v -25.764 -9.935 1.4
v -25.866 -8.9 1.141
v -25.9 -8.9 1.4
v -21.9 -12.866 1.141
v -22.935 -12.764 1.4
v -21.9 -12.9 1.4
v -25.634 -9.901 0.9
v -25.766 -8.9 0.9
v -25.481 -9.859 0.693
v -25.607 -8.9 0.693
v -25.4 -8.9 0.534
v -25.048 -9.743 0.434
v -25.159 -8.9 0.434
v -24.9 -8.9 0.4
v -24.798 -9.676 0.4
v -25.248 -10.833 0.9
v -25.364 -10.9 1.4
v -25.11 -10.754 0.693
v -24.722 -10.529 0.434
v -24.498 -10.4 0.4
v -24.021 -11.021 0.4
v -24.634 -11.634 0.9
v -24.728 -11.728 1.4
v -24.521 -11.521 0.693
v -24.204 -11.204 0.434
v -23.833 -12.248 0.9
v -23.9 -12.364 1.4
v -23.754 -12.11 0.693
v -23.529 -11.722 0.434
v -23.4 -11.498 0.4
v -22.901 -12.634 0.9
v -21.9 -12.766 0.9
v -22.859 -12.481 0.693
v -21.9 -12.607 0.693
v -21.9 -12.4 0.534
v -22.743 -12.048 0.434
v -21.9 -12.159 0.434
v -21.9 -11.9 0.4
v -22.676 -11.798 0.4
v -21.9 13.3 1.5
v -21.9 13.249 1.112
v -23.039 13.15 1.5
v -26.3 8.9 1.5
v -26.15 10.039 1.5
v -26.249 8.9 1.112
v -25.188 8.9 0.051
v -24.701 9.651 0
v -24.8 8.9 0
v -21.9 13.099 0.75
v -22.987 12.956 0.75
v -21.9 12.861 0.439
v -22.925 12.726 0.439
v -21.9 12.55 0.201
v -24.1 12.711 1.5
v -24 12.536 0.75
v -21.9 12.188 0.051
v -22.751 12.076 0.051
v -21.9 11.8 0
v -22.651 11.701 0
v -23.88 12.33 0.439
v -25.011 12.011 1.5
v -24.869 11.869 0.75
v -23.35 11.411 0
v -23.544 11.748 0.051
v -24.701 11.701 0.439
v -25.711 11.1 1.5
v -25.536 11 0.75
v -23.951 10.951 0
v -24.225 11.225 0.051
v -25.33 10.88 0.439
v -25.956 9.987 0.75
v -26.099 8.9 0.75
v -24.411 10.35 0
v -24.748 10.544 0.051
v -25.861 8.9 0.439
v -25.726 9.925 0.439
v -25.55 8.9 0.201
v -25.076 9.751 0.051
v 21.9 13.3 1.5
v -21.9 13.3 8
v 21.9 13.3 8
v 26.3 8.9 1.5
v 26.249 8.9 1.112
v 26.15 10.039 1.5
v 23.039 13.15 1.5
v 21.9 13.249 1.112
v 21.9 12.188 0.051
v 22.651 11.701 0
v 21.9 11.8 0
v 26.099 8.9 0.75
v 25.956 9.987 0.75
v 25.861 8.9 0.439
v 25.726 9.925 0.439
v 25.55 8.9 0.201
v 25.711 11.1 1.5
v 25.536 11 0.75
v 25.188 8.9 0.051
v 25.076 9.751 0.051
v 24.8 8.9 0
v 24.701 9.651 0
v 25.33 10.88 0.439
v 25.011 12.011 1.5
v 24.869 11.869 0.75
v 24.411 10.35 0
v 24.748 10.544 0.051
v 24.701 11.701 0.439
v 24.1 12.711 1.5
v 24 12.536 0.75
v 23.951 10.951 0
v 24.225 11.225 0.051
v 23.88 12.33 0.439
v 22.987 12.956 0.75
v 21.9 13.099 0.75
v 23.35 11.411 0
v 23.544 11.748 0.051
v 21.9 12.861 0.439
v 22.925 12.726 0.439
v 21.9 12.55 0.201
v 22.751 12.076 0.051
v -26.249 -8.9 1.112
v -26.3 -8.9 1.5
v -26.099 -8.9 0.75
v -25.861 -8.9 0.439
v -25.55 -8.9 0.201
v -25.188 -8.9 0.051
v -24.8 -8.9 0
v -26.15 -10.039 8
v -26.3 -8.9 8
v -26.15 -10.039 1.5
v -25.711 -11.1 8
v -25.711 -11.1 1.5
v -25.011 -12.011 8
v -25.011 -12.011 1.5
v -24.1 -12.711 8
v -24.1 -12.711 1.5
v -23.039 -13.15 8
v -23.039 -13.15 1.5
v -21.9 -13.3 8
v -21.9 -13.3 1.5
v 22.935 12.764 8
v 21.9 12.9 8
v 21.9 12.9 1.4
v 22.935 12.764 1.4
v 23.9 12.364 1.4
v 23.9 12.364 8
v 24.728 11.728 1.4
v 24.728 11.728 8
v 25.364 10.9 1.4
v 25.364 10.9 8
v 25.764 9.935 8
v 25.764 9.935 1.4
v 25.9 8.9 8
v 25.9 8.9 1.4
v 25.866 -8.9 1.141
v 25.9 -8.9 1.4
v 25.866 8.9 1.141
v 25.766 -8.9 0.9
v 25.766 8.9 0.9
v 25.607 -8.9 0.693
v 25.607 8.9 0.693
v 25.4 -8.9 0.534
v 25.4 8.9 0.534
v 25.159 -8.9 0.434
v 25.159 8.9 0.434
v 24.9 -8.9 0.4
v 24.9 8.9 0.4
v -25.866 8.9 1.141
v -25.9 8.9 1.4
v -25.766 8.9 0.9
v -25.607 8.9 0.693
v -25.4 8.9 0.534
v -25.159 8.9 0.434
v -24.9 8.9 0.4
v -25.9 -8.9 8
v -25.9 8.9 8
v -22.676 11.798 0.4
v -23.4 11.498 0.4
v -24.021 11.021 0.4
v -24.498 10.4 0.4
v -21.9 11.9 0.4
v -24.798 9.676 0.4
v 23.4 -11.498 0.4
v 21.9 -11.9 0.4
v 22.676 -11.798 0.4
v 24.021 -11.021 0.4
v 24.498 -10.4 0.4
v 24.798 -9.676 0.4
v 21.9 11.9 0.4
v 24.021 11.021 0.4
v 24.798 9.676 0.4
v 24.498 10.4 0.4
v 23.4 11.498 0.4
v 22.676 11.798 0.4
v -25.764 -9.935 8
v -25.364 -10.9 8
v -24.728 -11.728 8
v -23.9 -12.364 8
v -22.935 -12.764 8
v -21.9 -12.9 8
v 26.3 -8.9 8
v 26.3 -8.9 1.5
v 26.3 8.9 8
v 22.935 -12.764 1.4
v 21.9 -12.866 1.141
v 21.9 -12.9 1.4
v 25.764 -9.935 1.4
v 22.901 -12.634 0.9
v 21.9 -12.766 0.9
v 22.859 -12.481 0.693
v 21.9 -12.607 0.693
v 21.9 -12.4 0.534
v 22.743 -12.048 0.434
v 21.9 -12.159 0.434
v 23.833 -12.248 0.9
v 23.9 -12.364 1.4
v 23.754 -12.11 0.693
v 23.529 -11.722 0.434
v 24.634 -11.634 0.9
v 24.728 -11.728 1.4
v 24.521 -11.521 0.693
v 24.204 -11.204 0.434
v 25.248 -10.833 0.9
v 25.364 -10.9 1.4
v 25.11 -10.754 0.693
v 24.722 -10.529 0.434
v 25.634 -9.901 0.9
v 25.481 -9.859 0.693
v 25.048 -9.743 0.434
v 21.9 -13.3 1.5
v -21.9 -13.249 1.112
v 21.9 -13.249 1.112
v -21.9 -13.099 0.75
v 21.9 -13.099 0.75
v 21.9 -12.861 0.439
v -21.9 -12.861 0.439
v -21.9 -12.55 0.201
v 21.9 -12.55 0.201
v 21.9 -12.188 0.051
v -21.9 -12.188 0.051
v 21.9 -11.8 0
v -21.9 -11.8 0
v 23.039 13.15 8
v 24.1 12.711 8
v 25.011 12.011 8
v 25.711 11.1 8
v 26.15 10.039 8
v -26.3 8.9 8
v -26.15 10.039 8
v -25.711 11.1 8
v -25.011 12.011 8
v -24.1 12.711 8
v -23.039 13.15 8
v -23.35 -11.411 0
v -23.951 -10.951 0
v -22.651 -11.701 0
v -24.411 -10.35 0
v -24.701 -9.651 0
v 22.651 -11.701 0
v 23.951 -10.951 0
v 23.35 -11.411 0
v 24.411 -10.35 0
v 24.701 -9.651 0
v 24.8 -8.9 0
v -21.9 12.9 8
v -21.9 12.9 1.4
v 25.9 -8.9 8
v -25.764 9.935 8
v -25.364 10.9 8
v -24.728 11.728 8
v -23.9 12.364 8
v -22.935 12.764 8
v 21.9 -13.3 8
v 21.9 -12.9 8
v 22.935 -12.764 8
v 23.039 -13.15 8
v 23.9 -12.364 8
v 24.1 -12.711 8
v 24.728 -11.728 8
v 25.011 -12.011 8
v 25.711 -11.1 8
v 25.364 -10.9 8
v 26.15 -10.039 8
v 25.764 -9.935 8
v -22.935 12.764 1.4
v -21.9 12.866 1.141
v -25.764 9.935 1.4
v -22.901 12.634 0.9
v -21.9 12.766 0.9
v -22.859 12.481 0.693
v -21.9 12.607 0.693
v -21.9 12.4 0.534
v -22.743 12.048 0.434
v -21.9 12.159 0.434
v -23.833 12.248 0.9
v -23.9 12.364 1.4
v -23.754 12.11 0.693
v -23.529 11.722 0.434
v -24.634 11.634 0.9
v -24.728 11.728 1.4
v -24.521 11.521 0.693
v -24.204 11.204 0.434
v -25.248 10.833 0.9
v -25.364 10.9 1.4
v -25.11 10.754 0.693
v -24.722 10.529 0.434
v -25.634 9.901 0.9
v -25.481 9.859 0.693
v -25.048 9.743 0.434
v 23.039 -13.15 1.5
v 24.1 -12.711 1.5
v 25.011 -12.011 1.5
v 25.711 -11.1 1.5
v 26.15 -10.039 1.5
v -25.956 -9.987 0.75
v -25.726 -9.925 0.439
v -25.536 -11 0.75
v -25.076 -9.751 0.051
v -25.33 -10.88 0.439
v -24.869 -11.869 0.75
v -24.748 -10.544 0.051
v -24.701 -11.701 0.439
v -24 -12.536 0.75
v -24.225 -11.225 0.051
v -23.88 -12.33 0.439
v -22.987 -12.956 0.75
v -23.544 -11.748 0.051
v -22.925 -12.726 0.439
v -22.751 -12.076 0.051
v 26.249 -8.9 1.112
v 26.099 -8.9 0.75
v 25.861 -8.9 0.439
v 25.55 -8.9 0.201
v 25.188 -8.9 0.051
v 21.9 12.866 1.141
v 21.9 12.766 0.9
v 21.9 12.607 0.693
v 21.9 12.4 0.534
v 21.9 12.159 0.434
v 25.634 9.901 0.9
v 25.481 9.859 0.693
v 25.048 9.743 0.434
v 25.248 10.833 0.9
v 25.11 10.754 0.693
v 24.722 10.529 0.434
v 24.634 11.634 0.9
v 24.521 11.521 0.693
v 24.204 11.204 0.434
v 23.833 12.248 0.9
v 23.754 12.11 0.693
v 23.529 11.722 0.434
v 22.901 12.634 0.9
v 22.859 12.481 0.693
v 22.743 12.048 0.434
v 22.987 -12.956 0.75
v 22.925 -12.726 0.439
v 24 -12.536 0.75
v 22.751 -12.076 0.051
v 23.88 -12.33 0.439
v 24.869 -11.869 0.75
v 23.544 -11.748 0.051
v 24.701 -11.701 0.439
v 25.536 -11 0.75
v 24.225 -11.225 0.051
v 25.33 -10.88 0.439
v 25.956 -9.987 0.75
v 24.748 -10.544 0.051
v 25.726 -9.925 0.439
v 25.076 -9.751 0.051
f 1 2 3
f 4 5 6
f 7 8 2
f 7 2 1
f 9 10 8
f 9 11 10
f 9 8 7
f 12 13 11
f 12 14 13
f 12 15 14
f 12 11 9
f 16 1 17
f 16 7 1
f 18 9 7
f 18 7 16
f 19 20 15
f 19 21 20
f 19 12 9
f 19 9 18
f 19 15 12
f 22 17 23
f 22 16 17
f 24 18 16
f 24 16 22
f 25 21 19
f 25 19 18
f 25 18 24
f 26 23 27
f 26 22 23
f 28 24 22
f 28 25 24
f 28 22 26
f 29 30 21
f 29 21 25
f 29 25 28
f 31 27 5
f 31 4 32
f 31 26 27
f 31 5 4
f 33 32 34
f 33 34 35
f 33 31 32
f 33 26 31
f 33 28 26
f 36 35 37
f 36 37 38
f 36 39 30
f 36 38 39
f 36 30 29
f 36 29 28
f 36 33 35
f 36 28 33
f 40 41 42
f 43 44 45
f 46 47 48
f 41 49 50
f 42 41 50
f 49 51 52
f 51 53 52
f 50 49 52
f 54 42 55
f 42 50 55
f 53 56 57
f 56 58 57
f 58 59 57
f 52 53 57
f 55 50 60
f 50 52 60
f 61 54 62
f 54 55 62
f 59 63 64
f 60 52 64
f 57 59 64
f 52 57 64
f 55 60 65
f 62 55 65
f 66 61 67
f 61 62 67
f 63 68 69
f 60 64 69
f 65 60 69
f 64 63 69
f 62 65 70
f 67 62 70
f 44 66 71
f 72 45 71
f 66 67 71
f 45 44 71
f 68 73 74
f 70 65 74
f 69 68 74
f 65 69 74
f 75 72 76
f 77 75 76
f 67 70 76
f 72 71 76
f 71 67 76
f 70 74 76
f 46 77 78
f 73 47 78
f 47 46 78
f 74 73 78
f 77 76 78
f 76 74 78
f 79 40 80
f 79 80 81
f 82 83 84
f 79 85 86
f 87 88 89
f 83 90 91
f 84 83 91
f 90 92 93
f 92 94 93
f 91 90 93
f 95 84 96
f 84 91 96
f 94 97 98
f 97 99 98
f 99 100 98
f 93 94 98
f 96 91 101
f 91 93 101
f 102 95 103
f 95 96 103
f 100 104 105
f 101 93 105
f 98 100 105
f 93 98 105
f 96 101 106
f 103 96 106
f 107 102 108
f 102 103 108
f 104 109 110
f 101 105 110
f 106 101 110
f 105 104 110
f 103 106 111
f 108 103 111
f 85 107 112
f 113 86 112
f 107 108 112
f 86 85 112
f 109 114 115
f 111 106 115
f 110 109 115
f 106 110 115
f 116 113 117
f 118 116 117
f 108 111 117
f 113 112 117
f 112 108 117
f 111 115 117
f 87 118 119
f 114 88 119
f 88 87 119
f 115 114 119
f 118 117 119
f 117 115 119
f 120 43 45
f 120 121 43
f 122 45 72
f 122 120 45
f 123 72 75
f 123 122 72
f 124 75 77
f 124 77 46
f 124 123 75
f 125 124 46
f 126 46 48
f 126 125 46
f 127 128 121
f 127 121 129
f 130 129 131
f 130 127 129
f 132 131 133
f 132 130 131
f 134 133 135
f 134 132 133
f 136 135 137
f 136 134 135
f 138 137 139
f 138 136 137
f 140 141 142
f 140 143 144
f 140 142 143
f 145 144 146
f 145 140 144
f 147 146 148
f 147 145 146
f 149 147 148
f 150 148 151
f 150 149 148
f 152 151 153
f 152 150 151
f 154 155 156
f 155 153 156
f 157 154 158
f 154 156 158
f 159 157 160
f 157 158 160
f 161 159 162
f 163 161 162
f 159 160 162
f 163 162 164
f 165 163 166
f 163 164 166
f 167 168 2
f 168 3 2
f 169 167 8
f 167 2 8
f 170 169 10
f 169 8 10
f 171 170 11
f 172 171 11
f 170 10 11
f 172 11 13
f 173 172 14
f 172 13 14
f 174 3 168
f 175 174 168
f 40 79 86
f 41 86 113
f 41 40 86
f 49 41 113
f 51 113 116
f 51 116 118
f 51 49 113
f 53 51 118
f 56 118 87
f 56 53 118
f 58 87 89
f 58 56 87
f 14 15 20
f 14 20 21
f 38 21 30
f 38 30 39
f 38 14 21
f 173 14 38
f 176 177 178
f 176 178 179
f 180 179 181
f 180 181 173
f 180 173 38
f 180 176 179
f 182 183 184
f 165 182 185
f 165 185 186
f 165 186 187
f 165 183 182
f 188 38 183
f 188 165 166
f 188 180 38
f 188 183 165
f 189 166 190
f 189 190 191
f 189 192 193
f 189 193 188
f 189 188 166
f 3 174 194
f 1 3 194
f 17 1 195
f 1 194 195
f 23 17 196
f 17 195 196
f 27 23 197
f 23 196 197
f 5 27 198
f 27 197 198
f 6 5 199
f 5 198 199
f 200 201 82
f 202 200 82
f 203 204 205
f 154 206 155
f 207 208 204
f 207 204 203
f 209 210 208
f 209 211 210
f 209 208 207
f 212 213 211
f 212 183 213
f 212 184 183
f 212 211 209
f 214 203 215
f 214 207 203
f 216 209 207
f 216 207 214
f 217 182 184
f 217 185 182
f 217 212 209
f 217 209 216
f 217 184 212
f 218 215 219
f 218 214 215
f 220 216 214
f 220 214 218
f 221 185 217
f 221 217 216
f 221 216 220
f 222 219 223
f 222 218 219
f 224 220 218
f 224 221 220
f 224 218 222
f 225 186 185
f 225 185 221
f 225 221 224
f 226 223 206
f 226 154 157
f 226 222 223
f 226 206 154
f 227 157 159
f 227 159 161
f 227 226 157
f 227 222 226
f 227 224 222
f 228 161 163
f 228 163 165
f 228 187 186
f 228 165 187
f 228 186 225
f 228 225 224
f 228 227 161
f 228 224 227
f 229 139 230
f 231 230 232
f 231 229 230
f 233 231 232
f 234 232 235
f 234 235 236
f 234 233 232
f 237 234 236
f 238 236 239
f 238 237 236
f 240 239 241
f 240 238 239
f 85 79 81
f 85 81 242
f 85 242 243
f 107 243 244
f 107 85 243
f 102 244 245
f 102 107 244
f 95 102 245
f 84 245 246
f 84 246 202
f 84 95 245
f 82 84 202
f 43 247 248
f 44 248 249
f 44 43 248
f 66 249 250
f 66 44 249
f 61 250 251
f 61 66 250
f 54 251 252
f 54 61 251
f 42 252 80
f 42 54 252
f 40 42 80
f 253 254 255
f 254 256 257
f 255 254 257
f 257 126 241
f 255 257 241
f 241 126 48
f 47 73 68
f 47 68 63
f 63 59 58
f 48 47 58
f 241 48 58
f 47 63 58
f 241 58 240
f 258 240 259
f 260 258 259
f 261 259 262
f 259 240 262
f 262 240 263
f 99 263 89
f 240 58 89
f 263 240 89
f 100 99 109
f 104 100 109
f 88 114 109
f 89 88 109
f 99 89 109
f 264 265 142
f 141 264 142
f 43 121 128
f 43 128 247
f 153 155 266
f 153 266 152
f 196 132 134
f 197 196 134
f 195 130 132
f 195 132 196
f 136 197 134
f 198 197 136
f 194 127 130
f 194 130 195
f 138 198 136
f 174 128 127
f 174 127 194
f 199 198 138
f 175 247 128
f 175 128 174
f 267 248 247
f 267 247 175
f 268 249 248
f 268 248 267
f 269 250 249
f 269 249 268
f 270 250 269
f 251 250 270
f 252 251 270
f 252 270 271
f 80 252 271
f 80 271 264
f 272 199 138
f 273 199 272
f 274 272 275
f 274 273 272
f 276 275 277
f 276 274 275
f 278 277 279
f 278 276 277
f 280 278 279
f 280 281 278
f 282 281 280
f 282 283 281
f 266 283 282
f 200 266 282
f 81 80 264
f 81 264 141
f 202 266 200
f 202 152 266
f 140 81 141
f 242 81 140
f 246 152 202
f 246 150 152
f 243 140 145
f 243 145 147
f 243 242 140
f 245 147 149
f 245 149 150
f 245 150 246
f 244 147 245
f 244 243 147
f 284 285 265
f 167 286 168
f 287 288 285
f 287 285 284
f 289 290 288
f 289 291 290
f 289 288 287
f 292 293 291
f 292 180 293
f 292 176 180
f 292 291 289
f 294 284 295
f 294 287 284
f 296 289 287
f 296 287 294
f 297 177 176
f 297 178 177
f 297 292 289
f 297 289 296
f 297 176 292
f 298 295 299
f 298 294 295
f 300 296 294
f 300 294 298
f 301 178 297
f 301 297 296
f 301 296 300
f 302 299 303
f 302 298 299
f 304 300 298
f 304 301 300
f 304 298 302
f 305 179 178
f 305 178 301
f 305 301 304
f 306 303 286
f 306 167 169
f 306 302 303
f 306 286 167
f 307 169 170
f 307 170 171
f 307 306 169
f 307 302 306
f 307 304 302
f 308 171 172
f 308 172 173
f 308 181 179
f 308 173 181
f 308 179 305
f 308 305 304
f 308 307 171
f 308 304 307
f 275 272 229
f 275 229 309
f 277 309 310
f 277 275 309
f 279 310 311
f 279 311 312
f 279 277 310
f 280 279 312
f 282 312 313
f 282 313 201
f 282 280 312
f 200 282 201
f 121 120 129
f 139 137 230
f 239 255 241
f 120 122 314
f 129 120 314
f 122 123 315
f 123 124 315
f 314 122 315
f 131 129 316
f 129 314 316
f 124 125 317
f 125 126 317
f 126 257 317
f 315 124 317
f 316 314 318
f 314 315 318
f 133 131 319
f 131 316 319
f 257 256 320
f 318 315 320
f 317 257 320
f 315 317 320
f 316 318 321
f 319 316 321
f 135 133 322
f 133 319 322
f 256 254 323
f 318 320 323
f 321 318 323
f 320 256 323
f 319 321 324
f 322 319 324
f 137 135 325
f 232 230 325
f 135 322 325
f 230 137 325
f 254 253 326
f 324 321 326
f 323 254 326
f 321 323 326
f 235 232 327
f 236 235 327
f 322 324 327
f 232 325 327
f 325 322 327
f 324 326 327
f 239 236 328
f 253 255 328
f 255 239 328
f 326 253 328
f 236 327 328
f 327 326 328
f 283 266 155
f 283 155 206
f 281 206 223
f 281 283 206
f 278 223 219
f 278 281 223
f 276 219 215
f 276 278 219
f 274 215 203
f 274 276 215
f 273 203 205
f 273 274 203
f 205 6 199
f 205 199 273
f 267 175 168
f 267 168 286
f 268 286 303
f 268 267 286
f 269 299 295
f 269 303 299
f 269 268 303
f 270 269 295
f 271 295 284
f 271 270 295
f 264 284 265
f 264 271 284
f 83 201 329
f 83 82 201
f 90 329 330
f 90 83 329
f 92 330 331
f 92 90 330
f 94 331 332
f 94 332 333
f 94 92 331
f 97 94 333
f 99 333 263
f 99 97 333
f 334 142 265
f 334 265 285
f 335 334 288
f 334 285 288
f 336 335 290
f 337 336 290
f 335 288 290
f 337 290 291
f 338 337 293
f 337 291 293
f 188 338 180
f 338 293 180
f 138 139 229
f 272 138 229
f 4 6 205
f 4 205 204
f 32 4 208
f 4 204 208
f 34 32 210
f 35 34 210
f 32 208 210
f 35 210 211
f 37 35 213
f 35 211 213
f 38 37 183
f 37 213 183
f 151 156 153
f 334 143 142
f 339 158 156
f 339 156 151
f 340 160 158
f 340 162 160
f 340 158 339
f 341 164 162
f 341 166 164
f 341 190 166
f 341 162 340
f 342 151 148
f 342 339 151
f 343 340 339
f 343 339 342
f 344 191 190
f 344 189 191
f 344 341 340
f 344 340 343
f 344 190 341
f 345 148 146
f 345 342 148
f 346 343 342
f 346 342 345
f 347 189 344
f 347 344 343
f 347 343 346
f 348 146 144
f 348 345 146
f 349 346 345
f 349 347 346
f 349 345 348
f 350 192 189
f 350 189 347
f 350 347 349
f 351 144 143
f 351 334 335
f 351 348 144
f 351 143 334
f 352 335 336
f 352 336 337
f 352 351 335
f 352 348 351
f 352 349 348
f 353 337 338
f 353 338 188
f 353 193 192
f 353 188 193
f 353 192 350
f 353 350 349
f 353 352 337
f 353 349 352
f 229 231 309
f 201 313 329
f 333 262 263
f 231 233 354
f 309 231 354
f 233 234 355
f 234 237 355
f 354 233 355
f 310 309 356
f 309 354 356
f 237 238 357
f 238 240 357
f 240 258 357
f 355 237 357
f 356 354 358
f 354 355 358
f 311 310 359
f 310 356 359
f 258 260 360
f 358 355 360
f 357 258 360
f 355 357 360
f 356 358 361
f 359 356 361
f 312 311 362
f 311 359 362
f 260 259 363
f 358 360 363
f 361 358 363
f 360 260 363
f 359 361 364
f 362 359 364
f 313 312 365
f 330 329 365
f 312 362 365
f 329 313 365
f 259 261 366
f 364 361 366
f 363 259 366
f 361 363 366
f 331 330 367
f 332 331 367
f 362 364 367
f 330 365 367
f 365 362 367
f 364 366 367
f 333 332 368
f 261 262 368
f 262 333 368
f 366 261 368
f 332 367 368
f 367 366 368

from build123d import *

# Parameters (mm, degrees)
F0_W     = 52.6
F0_H     = 26.6
F0_W_2   = 51.8
F0_H_2   = 25.8
F1_DEPTH = 0.4
F2_DEPTH = 8
F3_R     = 4
F4_R     = 4.4
F5_R     = 1
F6_R     = 1.5


with BuildPart() as f1:
    # F0 (on Top) → F1 (new body)
    with BuildSketch(Plane.XY):
        Rectangle(F0_W, F0_H)
        Rectangle(F0_W_2, F0_H_2, mode=Mode.SUBTRACT)
        Rectangle(F0_W_2, F0_H_2)
    extrude(amount=F1_DEPTH)

    # F0 (on Top) → F2 (join)
    with BuildSketch(Plane.XY):
        Rectangle(F0_W, F0_H)
        Rectangle(F0_W_2, F0_H_2, mode=Mode.SUBTRACT)
    extrude(amount=F2_DEPTH)

    # F3
    f3_edges = [f1.edges().sort_by_distance(p)[0] for p in [
        (-25.9, 12.9, 4.2),
        (25.9, 12.9, 4.2),
        (25.9, -12.9, 4.2),
        (-25.9, -12.9, 4.2),
    ]]
    fillet(f3_edges, radius=F3_R)

    # F4
    f4_edges = [f1.edges().sort_by_distance(p)[0] for p in [
        (26.3, 13.3, 4),
        (26.3, -13.3, 4),
        (-26.3, 13.3, 4),
        (-26.3, -13.3, 4),
    ]]
    fillet(f4_edges, radius=F4_R)

    # F5
    f5_edges = [f1.edges().sort_by_distance(p)[0] for p in [
        (0, 12.9, 0.4),
    ]]
    fillet(f5_edges, radius=F5_R)

    # F6
    f6_edges = [f1.edges().sort_by_distance(p)[0] for p in [
        (0, -13.3, 0),
    ]]
    fillet(f6_edges, radius=F6_R)


solid = f1.part
